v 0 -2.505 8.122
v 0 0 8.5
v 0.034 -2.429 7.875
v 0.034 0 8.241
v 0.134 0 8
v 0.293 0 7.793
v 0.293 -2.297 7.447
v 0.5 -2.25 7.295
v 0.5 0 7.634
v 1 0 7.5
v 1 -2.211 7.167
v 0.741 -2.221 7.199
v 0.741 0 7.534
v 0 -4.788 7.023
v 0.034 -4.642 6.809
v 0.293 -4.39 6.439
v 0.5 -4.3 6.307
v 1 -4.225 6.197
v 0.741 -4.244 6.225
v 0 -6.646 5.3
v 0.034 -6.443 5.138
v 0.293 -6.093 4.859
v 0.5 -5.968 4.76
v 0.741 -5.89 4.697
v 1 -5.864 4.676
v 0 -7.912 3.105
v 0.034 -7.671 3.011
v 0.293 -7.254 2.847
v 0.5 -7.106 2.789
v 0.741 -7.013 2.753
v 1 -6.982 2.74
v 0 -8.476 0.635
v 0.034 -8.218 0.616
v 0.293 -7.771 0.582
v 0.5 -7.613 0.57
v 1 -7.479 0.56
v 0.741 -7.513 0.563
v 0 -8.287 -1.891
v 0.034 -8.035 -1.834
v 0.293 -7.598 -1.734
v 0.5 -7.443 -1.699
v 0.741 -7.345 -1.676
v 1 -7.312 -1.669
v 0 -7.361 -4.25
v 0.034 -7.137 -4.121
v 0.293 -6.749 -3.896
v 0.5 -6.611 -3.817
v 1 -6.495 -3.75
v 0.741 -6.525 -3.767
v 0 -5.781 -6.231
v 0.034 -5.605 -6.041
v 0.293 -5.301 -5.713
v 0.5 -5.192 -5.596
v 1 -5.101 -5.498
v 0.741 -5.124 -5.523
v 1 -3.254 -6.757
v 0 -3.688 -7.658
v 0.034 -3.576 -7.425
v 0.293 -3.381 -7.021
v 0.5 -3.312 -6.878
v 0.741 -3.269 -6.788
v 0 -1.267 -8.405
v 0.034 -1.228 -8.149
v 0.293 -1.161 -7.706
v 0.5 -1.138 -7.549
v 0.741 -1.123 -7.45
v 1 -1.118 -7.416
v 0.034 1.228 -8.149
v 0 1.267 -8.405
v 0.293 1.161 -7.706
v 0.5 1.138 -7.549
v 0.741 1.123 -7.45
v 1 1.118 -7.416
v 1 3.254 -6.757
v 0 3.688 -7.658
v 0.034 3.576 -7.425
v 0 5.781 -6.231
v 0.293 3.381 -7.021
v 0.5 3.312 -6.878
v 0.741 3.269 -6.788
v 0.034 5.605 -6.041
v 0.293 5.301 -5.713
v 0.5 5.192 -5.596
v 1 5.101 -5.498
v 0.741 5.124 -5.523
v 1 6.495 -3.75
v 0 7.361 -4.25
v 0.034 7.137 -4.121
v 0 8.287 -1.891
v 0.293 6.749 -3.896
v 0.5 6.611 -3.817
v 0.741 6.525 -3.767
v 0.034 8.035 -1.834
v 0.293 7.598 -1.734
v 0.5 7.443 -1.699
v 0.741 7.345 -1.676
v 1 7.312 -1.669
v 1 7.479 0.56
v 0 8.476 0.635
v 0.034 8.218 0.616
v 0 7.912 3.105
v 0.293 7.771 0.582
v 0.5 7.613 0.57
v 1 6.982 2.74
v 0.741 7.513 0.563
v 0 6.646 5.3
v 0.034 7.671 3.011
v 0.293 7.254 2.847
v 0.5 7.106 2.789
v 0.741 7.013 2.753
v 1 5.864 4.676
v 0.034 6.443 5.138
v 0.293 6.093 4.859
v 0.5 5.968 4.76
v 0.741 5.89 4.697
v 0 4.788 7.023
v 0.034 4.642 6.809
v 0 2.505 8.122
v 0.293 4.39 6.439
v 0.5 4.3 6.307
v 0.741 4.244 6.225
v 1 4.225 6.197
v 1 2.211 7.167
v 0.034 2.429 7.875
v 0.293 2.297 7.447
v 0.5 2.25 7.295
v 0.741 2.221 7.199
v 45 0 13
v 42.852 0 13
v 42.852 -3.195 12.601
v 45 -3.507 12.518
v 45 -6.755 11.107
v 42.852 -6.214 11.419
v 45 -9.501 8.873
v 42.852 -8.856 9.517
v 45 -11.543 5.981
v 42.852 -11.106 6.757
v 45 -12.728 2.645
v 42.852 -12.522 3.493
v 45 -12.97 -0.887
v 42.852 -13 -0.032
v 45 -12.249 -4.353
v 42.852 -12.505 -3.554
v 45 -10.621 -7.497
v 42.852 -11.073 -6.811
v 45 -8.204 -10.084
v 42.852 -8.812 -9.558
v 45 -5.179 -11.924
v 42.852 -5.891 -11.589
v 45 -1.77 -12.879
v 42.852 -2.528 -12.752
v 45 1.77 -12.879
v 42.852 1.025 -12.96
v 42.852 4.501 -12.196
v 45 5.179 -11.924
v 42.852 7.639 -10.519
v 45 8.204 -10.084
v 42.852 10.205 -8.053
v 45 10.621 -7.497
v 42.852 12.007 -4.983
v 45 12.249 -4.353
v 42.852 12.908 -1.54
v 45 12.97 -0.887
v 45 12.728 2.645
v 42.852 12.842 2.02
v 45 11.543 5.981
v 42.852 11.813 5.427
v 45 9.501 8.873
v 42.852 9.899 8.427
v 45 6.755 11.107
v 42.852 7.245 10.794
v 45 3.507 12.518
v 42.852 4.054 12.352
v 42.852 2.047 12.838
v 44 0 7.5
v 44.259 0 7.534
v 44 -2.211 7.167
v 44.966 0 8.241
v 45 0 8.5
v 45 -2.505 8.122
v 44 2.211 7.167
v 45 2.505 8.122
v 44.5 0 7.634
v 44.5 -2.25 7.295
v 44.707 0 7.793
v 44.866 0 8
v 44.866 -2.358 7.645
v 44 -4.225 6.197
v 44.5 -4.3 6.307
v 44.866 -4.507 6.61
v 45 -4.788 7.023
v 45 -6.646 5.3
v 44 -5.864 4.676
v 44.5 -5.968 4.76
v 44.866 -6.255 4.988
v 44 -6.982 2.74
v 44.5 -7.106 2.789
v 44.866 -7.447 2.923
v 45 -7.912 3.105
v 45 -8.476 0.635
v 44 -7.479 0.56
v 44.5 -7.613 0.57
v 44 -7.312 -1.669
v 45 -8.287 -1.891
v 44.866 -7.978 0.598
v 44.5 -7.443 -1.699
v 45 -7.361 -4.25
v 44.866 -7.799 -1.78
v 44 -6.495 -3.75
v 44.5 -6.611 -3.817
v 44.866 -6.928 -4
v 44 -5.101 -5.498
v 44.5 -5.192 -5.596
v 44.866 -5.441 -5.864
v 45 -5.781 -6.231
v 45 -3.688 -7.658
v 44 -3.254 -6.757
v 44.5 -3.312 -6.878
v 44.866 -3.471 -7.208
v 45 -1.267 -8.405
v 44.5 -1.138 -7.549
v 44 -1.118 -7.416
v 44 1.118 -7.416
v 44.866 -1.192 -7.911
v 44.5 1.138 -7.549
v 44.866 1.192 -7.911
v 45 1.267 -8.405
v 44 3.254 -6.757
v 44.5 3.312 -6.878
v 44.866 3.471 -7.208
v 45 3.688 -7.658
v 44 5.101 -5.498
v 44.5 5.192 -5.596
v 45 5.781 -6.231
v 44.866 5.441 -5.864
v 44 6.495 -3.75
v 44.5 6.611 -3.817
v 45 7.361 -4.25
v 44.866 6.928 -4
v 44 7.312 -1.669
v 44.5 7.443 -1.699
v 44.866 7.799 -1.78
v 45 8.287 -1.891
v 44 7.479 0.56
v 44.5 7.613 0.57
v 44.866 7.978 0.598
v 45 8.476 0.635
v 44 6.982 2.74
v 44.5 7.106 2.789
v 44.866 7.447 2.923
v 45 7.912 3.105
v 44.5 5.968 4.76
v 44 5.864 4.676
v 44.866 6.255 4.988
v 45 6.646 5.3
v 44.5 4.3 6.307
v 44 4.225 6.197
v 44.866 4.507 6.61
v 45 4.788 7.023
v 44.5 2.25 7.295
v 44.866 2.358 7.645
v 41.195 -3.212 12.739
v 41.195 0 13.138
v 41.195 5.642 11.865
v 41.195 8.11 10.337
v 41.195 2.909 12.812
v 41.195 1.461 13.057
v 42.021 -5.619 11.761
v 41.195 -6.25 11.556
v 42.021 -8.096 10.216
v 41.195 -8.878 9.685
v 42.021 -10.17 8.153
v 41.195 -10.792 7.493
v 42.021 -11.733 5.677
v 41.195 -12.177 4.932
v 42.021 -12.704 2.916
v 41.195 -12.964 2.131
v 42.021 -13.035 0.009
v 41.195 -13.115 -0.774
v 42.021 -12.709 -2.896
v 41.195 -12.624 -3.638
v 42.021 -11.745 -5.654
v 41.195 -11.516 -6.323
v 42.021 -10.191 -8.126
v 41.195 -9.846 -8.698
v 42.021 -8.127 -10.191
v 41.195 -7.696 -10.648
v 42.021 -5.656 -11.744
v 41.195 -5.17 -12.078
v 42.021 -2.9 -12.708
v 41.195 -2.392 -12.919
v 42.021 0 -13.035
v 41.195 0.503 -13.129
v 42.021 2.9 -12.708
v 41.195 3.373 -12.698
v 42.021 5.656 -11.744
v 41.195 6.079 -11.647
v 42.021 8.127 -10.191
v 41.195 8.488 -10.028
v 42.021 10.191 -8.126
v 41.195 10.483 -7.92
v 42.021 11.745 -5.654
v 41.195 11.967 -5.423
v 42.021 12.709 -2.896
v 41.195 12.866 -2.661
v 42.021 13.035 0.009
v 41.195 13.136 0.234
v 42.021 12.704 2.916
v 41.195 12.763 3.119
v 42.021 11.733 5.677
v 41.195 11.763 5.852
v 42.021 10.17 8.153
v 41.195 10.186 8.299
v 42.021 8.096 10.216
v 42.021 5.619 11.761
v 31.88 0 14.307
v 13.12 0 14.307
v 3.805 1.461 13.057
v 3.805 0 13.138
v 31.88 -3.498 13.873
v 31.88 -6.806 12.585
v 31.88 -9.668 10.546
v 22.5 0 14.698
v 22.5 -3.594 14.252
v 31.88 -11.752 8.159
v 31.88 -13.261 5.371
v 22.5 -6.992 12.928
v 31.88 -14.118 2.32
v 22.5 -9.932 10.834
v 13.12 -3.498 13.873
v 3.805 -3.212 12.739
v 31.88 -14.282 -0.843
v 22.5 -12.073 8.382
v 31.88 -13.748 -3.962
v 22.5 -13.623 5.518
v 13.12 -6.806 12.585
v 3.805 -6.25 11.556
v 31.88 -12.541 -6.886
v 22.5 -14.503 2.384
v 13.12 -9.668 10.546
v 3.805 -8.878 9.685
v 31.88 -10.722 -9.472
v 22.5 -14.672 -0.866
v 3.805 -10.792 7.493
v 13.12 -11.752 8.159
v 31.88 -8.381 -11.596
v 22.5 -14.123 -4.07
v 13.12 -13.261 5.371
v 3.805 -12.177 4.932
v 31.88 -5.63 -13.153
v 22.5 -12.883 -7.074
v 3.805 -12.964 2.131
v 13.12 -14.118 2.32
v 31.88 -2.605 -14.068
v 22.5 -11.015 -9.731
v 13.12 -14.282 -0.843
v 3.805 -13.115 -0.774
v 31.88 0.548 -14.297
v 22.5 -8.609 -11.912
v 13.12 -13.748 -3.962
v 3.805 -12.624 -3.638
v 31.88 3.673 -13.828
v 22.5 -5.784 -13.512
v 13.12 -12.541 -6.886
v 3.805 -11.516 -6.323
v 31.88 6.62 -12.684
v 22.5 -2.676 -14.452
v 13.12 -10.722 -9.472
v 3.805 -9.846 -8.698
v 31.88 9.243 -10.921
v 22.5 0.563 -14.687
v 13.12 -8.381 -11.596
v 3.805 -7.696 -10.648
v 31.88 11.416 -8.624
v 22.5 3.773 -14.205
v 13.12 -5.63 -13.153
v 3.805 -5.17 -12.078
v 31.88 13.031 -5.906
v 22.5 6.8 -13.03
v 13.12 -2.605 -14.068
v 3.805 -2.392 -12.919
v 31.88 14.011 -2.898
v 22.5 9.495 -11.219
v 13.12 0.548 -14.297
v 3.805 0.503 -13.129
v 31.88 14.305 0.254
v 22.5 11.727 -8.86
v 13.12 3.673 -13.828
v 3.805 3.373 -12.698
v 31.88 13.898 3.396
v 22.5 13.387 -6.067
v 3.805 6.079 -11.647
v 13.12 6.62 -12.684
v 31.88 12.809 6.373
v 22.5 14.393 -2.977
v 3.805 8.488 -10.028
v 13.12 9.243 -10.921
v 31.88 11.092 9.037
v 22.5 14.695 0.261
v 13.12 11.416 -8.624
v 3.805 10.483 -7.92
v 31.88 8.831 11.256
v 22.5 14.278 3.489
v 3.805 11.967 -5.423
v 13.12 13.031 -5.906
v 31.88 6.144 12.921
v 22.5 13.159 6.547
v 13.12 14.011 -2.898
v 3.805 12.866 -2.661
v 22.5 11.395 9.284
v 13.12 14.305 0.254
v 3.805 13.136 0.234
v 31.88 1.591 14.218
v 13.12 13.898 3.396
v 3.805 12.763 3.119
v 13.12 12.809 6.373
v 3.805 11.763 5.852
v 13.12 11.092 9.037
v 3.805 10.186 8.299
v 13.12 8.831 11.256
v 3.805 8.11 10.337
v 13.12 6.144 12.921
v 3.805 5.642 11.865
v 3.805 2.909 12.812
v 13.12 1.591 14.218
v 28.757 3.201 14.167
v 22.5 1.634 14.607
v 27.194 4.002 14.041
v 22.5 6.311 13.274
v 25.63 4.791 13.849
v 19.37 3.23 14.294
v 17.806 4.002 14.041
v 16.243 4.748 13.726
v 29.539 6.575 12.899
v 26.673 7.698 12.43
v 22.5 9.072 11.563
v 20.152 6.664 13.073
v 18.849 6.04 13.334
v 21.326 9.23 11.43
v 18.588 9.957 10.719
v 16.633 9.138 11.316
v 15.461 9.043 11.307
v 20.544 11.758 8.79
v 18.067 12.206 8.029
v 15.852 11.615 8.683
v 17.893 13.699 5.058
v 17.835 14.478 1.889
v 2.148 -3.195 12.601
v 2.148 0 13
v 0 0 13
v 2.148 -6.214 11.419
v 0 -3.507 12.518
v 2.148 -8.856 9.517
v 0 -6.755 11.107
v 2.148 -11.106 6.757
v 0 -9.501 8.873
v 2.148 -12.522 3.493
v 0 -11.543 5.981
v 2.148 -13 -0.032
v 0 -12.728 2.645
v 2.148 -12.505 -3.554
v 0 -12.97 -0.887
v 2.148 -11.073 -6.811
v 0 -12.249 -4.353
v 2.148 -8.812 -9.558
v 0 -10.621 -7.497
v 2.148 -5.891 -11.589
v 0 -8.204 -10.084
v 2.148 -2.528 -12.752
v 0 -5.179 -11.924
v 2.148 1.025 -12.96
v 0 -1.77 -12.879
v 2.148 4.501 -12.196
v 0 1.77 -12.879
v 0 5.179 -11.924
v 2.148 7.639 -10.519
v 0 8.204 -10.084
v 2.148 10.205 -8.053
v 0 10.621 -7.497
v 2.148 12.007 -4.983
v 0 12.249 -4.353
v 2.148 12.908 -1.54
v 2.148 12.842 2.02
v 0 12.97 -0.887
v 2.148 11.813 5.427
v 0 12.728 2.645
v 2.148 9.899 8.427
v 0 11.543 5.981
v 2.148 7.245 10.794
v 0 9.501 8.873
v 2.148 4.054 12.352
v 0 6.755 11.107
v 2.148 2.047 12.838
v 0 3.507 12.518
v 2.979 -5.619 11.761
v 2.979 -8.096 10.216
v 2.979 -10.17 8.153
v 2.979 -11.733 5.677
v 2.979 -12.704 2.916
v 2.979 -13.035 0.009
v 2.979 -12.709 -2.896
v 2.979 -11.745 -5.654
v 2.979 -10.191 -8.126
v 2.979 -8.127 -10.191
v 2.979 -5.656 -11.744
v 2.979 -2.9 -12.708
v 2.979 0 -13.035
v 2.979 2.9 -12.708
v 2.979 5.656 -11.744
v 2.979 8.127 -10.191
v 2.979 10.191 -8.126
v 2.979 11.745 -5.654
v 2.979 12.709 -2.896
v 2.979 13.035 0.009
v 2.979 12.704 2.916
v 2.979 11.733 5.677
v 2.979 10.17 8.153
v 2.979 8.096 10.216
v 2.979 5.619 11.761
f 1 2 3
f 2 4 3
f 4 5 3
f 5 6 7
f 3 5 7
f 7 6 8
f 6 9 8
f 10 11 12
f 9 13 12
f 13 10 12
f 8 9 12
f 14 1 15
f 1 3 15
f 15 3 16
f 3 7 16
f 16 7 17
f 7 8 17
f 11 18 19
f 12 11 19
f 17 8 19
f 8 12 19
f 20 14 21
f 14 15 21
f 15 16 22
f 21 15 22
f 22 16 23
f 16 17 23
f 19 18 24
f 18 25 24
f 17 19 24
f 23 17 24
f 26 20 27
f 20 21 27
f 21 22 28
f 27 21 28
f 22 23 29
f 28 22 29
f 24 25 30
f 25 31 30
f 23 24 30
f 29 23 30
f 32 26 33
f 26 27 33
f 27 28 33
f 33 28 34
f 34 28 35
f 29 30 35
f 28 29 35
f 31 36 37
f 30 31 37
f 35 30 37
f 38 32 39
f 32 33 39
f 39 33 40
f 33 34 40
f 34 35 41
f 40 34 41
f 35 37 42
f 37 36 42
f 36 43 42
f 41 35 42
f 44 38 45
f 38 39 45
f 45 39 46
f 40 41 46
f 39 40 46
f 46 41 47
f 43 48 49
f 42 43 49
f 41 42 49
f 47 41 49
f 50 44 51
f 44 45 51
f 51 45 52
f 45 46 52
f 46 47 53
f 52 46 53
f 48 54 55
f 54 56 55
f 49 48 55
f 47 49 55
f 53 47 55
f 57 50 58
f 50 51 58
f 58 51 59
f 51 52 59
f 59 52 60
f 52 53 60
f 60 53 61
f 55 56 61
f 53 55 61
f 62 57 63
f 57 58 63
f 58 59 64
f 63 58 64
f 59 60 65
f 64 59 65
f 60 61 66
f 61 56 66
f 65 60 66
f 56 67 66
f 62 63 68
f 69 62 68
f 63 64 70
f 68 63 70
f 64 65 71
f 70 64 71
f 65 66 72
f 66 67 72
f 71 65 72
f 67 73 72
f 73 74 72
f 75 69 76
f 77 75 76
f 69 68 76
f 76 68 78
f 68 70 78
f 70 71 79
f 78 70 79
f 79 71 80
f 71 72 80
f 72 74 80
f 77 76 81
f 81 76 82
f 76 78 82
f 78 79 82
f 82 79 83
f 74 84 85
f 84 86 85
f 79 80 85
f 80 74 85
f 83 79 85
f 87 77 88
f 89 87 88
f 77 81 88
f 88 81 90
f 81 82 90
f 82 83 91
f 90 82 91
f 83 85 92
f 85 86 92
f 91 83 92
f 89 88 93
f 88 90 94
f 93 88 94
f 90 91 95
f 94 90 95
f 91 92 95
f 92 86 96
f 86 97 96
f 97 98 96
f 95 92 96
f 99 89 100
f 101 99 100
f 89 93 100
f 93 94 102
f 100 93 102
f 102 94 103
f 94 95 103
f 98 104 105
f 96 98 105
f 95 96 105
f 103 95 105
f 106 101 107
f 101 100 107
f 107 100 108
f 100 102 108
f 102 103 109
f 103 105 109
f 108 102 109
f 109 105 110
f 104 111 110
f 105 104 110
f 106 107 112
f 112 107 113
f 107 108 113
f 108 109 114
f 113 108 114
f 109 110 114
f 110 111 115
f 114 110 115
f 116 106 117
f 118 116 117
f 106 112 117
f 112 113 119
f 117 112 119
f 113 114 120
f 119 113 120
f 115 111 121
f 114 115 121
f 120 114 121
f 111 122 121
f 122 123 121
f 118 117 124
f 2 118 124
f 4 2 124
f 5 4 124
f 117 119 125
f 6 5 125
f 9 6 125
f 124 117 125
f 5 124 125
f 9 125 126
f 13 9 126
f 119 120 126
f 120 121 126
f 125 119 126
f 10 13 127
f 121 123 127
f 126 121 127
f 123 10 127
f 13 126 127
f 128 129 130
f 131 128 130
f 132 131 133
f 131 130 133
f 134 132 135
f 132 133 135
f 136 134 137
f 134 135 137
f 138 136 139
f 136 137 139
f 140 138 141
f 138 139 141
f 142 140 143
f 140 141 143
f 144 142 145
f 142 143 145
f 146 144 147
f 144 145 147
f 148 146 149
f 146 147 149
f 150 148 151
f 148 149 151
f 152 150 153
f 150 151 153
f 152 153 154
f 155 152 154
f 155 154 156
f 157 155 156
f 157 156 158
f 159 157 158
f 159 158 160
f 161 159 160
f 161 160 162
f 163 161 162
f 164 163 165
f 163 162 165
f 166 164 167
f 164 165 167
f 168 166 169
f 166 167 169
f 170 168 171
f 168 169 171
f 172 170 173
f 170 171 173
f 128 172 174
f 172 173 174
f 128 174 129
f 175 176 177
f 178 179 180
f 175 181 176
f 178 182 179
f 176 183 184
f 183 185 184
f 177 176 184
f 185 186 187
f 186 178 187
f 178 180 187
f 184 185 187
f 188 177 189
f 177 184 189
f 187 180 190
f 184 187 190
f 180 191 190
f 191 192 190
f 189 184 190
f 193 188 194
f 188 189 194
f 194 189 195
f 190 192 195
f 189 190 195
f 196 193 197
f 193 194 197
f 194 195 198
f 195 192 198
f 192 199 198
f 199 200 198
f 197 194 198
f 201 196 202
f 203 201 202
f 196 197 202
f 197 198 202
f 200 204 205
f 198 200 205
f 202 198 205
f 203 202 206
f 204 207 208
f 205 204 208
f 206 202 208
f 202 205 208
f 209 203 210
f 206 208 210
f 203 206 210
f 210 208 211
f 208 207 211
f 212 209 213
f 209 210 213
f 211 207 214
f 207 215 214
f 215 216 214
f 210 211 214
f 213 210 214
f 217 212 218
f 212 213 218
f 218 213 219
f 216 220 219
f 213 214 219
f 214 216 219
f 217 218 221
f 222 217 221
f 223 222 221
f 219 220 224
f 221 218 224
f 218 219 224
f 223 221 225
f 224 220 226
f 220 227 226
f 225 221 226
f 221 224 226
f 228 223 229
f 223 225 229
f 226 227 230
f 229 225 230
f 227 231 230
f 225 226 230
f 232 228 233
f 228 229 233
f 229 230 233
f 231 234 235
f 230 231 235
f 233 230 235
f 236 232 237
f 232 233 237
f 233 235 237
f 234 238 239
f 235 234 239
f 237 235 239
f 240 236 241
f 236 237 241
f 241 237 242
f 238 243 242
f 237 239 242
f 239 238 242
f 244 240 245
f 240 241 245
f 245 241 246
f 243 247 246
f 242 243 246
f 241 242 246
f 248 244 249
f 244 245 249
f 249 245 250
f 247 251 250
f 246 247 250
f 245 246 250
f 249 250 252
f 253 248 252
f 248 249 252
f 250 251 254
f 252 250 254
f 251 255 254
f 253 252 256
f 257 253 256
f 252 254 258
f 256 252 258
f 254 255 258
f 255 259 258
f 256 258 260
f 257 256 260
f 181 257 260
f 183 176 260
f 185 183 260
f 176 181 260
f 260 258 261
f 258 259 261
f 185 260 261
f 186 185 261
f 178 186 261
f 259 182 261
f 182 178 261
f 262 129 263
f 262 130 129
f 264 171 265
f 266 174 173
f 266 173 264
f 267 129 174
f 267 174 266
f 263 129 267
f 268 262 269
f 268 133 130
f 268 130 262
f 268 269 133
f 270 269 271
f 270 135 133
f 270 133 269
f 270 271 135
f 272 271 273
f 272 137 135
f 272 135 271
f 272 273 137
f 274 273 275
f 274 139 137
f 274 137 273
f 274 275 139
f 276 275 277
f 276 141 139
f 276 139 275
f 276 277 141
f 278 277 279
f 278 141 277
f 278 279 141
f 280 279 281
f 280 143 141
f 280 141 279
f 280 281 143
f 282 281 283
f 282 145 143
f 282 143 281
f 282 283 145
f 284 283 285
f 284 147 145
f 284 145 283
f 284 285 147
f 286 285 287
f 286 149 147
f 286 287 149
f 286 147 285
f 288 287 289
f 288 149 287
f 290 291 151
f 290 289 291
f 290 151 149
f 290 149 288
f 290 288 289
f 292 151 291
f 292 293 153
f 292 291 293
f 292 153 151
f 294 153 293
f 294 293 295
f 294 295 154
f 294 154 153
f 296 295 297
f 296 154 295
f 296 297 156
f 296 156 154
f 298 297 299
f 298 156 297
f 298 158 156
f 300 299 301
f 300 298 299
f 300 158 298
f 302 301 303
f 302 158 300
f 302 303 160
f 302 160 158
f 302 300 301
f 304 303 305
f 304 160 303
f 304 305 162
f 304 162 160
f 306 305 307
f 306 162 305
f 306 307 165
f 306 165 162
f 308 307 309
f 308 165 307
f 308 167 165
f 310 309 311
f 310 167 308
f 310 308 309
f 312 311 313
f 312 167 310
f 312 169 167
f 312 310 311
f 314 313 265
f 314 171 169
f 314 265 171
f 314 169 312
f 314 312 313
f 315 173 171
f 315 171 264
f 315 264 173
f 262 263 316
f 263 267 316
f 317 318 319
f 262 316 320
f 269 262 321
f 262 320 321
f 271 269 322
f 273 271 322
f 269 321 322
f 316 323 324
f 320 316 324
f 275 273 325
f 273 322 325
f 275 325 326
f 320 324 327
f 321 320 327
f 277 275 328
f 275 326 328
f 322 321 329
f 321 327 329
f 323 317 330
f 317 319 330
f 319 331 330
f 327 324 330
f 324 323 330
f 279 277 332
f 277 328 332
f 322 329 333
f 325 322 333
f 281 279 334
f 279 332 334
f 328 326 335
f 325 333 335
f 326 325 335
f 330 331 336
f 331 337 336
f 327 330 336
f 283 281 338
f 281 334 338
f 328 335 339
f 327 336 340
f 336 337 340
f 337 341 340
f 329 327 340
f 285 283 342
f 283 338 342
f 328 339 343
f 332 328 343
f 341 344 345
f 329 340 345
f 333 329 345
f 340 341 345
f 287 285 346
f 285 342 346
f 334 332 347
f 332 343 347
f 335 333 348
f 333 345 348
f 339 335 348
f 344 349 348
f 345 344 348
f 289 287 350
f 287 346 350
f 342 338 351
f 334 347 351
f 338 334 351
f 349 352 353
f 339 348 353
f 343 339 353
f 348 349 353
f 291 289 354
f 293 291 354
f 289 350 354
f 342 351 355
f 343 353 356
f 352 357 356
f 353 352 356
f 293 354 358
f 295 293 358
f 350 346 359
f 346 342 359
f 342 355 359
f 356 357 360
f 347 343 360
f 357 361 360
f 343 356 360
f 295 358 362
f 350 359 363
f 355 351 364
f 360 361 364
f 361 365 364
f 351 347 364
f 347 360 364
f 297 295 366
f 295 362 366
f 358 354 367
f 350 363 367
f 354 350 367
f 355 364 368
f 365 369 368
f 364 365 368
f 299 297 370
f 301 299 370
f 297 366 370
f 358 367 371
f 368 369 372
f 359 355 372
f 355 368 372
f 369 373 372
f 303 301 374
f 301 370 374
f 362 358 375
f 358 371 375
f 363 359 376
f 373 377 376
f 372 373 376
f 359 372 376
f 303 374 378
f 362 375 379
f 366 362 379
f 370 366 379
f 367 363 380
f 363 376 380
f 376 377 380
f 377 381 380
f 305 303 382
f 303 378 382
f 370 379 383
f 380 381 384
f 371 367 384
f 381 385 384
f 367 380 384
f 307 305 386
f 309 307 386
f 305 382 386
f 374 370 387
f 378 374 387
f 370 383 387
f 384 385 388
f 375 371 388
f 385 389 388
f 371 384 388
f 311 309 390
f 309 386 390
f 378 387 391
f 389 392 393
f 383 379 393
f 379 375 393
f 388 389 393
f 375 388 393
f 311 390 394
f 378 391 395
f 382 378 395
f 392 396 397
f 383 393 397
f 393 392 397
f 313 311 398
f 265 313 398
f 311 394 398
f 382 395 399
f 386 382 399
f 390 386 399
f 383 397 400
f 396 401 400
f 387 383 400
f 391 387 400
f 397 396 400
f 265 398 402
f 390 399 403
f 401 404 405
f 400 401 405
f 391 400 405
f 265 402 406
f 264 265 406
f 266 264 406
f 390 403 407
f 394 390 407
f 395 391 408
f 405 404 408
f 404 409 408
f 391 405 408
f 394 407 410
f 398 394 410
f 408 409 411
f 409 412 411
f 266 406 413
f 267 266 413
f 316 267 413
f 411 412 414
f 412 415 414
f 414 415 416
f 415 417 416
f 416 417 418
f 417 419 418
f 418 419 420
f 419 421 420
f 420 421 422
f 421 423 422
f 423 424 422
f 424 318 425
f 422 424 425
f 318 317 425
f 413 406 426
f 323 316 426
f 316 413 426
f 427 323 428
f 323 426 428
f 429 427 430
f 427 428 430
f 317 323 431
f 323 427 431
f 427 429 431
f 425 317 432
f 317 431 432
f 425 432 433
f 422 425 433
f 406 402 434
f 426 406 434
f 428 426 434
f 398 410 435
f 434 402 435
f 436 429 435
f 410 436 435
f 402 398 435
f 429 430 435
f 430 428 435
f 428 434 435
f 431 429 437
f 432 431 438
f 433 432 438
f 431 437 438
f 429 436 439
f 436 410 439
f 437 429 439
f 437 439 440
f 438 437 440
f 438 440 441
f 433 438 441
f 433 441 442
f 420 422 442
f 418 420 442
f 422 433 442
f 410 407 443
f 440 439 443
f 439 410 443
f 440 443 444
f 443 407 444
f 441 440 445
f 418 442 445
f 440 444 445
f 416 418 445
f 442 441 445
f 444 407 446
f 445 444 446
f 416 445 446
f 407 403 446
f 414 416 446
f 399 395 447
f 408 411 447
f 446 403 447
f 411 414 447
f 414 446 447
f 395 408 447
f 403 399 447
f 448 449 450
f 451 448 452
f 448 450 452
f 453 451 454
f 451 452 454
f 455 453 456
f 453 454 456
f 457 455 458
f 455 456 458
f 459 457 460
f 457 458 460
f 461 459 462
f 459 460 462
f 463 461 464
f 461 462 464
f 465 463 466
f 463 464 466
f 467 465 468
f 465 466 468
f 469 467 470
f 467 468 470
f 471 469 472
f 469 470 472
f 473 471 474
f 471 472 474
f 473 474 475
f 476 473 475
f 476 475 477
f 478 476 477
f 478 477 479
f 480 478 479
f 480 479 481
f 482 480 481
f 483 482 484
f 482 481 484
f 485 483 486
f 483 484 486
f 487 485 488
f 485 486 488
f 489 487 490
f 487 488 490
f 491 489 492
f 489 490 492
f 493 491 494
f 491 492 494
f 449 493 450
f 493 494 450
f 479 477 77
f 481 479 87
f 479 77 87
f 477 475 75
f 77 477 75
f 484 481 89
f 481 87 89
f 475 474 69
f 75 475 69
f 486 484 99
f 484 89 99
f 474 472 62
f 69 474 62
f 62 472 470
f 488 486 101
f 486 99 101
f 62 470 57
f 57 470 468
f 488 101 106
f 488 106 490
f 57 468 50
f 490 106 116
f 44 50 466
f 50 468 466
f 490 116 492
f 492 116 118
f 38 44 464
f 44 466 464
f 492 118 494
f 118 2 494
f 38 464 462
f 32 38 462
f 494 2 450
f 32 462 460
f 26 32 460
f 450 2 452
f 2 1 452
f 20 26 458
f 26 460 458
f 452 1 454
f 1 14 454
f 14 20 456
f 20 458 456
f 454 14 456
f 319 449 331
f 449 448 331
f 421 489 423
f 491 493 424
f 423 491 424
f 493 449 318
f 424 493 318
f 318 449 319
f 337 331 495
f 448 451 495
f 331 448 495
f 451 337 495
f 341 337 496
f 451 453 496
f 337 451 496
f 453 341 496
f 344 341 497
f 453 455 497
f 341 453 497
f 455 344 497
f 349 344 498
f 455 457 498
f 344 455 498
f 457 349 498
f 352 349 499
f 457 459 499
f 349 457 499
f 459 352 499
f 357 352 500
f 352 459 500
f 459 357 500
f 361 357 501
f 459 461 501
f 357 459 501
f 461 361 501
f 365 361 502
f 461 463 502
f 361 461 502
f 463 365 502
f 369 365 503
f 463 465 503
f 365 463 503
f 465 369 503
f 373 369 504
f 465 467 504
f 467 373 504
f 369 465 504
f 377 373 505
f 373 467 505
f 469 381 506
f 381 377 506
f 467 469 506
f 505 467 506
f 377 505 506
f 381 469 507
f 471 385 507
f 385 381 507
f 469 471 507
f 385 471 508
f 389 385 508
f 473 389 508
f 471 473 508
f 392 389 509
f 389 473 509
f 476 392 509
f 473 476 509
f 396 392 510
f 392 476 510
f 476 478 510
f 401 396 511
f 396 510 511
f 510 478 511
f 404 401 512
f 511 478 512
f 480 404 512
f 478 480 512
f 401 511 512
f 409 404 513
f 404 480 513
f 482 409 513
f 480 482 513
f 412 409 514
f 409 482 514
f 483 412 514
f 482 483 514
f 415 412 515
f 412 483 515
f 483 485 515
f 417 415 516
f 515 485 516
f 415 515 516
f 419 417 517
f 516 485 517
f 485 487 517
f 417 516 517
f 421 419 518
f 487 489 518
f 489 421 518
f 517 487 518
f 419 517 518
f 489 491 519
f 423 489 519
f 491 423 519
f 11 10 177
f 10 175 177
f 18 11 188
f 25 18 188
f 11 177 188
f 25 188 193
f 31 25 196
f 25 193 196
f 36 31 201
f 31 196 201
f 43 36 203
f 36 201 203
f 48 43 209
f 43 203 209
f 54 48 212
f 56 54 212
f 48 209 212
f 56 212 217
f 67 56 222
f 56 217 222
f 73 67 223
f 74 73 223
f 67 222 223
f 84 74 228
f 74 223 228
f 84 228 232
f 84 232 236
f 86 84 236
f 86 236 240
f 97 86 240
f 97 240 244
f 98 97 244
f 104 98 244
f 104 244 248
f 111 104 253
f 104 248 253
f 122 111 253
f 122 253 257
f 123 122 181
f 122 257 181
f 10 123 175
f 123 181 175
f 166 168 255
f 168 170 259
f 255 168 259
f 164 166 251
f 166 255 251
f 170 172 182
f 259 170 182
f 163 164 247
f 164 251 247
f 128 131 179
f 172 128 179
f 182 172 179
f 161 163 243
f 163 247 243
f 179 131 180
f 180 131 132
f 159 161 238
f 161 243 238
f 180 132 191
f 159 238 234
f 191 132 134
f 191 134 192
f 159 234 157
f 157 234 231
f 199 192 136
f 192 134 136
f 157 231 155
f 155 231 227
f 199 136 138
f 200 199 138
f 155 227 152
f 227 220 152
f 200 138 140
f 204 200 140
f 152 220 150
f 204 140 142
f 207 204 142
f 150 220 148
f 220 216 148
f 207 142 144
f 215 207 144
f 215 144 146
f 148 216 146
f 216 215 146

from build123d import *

# Parameters (mm, degrees)
F2_R = 10


with BuildPart() as f1:
    # F0 (on Front) → F1 (revolve)
    with BuildSketch(Plane.XZ):
        with BuildLine():
            Line((3, 13), (0, 13))
            Line((0, 13), (0, 8.5))
            ThreePointArc((0, 8.5), (0.292893, 7.792893), (1, 7.5))
            Line((1, 7.5), (44, 7.5))
            ThreePointArc((44, 7.5), (44.707107, 7.792893), (45, 8.5))
            Line((45, 8.5), (45, 13))
            Line((45, 13), (42, 13))
            ThreePointArc((42, 13), (22.5, 14.69766), (3, 13))
        make_face()
    revolve(axis=Axis((9.438974, 0, 0), (1, 0, 0)))

    # F2
    f2_edges = [f1.edges().sort_by_distance(p)[0] for p in [
        (3, 0, -13),
        (42, 0, -13),
    ]]
    fillet(f2_edges, radius=F2_R)


solid = f1.part
